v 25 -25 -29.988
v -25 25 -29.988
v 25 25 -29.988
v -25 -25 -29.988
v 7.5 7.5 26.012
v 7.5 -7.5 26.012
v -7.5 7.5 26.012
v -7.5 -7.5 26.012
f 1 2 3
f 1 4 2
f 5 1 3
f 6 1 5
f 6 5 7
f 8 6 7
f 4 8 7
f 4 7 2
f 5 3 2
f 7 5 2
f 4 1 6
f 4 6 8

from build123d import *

# Parameters (mm, degrees)
F1_DEPTH = 25
F2_SIZE2 = 55.99999
F2_SIZE  = 17.49999


# Not quite as in the source:
# - a fillet or chamfer is up to 0.001 mm smaller than in the source, because OpenCascade refuses the exact size


with BuildPart() as f1:
    # F0 (on Front) → F1 (new body, symmetric)
    with BuildSketch(Plane.XZ):
        Polygon((25, -29.9881670944), (7.5, 26.0118329056), (-7.5, 26.0118329056), (-25, -29.9881670944), align=None)
    extrude(amount=F1_DEPTH, both=True)

    # F2 (size 17.5 and 56 in the source; OpenCascade refuses exactly that, so slightly less here)
    f2_edges = [f1.edges().sort_by_distance(p)[0] for p in [
        (0, 25, 26.011833),
        (0, -25, 26.011833),
    ]]
    f2_side = f1.faces().sort_by_distance((0, 0, 26.011833))[0]
    chamfer(f2_edges, length=F2_SIZE, length2=F2_SIZE2, reference=f2_side)


solid = f1.part
